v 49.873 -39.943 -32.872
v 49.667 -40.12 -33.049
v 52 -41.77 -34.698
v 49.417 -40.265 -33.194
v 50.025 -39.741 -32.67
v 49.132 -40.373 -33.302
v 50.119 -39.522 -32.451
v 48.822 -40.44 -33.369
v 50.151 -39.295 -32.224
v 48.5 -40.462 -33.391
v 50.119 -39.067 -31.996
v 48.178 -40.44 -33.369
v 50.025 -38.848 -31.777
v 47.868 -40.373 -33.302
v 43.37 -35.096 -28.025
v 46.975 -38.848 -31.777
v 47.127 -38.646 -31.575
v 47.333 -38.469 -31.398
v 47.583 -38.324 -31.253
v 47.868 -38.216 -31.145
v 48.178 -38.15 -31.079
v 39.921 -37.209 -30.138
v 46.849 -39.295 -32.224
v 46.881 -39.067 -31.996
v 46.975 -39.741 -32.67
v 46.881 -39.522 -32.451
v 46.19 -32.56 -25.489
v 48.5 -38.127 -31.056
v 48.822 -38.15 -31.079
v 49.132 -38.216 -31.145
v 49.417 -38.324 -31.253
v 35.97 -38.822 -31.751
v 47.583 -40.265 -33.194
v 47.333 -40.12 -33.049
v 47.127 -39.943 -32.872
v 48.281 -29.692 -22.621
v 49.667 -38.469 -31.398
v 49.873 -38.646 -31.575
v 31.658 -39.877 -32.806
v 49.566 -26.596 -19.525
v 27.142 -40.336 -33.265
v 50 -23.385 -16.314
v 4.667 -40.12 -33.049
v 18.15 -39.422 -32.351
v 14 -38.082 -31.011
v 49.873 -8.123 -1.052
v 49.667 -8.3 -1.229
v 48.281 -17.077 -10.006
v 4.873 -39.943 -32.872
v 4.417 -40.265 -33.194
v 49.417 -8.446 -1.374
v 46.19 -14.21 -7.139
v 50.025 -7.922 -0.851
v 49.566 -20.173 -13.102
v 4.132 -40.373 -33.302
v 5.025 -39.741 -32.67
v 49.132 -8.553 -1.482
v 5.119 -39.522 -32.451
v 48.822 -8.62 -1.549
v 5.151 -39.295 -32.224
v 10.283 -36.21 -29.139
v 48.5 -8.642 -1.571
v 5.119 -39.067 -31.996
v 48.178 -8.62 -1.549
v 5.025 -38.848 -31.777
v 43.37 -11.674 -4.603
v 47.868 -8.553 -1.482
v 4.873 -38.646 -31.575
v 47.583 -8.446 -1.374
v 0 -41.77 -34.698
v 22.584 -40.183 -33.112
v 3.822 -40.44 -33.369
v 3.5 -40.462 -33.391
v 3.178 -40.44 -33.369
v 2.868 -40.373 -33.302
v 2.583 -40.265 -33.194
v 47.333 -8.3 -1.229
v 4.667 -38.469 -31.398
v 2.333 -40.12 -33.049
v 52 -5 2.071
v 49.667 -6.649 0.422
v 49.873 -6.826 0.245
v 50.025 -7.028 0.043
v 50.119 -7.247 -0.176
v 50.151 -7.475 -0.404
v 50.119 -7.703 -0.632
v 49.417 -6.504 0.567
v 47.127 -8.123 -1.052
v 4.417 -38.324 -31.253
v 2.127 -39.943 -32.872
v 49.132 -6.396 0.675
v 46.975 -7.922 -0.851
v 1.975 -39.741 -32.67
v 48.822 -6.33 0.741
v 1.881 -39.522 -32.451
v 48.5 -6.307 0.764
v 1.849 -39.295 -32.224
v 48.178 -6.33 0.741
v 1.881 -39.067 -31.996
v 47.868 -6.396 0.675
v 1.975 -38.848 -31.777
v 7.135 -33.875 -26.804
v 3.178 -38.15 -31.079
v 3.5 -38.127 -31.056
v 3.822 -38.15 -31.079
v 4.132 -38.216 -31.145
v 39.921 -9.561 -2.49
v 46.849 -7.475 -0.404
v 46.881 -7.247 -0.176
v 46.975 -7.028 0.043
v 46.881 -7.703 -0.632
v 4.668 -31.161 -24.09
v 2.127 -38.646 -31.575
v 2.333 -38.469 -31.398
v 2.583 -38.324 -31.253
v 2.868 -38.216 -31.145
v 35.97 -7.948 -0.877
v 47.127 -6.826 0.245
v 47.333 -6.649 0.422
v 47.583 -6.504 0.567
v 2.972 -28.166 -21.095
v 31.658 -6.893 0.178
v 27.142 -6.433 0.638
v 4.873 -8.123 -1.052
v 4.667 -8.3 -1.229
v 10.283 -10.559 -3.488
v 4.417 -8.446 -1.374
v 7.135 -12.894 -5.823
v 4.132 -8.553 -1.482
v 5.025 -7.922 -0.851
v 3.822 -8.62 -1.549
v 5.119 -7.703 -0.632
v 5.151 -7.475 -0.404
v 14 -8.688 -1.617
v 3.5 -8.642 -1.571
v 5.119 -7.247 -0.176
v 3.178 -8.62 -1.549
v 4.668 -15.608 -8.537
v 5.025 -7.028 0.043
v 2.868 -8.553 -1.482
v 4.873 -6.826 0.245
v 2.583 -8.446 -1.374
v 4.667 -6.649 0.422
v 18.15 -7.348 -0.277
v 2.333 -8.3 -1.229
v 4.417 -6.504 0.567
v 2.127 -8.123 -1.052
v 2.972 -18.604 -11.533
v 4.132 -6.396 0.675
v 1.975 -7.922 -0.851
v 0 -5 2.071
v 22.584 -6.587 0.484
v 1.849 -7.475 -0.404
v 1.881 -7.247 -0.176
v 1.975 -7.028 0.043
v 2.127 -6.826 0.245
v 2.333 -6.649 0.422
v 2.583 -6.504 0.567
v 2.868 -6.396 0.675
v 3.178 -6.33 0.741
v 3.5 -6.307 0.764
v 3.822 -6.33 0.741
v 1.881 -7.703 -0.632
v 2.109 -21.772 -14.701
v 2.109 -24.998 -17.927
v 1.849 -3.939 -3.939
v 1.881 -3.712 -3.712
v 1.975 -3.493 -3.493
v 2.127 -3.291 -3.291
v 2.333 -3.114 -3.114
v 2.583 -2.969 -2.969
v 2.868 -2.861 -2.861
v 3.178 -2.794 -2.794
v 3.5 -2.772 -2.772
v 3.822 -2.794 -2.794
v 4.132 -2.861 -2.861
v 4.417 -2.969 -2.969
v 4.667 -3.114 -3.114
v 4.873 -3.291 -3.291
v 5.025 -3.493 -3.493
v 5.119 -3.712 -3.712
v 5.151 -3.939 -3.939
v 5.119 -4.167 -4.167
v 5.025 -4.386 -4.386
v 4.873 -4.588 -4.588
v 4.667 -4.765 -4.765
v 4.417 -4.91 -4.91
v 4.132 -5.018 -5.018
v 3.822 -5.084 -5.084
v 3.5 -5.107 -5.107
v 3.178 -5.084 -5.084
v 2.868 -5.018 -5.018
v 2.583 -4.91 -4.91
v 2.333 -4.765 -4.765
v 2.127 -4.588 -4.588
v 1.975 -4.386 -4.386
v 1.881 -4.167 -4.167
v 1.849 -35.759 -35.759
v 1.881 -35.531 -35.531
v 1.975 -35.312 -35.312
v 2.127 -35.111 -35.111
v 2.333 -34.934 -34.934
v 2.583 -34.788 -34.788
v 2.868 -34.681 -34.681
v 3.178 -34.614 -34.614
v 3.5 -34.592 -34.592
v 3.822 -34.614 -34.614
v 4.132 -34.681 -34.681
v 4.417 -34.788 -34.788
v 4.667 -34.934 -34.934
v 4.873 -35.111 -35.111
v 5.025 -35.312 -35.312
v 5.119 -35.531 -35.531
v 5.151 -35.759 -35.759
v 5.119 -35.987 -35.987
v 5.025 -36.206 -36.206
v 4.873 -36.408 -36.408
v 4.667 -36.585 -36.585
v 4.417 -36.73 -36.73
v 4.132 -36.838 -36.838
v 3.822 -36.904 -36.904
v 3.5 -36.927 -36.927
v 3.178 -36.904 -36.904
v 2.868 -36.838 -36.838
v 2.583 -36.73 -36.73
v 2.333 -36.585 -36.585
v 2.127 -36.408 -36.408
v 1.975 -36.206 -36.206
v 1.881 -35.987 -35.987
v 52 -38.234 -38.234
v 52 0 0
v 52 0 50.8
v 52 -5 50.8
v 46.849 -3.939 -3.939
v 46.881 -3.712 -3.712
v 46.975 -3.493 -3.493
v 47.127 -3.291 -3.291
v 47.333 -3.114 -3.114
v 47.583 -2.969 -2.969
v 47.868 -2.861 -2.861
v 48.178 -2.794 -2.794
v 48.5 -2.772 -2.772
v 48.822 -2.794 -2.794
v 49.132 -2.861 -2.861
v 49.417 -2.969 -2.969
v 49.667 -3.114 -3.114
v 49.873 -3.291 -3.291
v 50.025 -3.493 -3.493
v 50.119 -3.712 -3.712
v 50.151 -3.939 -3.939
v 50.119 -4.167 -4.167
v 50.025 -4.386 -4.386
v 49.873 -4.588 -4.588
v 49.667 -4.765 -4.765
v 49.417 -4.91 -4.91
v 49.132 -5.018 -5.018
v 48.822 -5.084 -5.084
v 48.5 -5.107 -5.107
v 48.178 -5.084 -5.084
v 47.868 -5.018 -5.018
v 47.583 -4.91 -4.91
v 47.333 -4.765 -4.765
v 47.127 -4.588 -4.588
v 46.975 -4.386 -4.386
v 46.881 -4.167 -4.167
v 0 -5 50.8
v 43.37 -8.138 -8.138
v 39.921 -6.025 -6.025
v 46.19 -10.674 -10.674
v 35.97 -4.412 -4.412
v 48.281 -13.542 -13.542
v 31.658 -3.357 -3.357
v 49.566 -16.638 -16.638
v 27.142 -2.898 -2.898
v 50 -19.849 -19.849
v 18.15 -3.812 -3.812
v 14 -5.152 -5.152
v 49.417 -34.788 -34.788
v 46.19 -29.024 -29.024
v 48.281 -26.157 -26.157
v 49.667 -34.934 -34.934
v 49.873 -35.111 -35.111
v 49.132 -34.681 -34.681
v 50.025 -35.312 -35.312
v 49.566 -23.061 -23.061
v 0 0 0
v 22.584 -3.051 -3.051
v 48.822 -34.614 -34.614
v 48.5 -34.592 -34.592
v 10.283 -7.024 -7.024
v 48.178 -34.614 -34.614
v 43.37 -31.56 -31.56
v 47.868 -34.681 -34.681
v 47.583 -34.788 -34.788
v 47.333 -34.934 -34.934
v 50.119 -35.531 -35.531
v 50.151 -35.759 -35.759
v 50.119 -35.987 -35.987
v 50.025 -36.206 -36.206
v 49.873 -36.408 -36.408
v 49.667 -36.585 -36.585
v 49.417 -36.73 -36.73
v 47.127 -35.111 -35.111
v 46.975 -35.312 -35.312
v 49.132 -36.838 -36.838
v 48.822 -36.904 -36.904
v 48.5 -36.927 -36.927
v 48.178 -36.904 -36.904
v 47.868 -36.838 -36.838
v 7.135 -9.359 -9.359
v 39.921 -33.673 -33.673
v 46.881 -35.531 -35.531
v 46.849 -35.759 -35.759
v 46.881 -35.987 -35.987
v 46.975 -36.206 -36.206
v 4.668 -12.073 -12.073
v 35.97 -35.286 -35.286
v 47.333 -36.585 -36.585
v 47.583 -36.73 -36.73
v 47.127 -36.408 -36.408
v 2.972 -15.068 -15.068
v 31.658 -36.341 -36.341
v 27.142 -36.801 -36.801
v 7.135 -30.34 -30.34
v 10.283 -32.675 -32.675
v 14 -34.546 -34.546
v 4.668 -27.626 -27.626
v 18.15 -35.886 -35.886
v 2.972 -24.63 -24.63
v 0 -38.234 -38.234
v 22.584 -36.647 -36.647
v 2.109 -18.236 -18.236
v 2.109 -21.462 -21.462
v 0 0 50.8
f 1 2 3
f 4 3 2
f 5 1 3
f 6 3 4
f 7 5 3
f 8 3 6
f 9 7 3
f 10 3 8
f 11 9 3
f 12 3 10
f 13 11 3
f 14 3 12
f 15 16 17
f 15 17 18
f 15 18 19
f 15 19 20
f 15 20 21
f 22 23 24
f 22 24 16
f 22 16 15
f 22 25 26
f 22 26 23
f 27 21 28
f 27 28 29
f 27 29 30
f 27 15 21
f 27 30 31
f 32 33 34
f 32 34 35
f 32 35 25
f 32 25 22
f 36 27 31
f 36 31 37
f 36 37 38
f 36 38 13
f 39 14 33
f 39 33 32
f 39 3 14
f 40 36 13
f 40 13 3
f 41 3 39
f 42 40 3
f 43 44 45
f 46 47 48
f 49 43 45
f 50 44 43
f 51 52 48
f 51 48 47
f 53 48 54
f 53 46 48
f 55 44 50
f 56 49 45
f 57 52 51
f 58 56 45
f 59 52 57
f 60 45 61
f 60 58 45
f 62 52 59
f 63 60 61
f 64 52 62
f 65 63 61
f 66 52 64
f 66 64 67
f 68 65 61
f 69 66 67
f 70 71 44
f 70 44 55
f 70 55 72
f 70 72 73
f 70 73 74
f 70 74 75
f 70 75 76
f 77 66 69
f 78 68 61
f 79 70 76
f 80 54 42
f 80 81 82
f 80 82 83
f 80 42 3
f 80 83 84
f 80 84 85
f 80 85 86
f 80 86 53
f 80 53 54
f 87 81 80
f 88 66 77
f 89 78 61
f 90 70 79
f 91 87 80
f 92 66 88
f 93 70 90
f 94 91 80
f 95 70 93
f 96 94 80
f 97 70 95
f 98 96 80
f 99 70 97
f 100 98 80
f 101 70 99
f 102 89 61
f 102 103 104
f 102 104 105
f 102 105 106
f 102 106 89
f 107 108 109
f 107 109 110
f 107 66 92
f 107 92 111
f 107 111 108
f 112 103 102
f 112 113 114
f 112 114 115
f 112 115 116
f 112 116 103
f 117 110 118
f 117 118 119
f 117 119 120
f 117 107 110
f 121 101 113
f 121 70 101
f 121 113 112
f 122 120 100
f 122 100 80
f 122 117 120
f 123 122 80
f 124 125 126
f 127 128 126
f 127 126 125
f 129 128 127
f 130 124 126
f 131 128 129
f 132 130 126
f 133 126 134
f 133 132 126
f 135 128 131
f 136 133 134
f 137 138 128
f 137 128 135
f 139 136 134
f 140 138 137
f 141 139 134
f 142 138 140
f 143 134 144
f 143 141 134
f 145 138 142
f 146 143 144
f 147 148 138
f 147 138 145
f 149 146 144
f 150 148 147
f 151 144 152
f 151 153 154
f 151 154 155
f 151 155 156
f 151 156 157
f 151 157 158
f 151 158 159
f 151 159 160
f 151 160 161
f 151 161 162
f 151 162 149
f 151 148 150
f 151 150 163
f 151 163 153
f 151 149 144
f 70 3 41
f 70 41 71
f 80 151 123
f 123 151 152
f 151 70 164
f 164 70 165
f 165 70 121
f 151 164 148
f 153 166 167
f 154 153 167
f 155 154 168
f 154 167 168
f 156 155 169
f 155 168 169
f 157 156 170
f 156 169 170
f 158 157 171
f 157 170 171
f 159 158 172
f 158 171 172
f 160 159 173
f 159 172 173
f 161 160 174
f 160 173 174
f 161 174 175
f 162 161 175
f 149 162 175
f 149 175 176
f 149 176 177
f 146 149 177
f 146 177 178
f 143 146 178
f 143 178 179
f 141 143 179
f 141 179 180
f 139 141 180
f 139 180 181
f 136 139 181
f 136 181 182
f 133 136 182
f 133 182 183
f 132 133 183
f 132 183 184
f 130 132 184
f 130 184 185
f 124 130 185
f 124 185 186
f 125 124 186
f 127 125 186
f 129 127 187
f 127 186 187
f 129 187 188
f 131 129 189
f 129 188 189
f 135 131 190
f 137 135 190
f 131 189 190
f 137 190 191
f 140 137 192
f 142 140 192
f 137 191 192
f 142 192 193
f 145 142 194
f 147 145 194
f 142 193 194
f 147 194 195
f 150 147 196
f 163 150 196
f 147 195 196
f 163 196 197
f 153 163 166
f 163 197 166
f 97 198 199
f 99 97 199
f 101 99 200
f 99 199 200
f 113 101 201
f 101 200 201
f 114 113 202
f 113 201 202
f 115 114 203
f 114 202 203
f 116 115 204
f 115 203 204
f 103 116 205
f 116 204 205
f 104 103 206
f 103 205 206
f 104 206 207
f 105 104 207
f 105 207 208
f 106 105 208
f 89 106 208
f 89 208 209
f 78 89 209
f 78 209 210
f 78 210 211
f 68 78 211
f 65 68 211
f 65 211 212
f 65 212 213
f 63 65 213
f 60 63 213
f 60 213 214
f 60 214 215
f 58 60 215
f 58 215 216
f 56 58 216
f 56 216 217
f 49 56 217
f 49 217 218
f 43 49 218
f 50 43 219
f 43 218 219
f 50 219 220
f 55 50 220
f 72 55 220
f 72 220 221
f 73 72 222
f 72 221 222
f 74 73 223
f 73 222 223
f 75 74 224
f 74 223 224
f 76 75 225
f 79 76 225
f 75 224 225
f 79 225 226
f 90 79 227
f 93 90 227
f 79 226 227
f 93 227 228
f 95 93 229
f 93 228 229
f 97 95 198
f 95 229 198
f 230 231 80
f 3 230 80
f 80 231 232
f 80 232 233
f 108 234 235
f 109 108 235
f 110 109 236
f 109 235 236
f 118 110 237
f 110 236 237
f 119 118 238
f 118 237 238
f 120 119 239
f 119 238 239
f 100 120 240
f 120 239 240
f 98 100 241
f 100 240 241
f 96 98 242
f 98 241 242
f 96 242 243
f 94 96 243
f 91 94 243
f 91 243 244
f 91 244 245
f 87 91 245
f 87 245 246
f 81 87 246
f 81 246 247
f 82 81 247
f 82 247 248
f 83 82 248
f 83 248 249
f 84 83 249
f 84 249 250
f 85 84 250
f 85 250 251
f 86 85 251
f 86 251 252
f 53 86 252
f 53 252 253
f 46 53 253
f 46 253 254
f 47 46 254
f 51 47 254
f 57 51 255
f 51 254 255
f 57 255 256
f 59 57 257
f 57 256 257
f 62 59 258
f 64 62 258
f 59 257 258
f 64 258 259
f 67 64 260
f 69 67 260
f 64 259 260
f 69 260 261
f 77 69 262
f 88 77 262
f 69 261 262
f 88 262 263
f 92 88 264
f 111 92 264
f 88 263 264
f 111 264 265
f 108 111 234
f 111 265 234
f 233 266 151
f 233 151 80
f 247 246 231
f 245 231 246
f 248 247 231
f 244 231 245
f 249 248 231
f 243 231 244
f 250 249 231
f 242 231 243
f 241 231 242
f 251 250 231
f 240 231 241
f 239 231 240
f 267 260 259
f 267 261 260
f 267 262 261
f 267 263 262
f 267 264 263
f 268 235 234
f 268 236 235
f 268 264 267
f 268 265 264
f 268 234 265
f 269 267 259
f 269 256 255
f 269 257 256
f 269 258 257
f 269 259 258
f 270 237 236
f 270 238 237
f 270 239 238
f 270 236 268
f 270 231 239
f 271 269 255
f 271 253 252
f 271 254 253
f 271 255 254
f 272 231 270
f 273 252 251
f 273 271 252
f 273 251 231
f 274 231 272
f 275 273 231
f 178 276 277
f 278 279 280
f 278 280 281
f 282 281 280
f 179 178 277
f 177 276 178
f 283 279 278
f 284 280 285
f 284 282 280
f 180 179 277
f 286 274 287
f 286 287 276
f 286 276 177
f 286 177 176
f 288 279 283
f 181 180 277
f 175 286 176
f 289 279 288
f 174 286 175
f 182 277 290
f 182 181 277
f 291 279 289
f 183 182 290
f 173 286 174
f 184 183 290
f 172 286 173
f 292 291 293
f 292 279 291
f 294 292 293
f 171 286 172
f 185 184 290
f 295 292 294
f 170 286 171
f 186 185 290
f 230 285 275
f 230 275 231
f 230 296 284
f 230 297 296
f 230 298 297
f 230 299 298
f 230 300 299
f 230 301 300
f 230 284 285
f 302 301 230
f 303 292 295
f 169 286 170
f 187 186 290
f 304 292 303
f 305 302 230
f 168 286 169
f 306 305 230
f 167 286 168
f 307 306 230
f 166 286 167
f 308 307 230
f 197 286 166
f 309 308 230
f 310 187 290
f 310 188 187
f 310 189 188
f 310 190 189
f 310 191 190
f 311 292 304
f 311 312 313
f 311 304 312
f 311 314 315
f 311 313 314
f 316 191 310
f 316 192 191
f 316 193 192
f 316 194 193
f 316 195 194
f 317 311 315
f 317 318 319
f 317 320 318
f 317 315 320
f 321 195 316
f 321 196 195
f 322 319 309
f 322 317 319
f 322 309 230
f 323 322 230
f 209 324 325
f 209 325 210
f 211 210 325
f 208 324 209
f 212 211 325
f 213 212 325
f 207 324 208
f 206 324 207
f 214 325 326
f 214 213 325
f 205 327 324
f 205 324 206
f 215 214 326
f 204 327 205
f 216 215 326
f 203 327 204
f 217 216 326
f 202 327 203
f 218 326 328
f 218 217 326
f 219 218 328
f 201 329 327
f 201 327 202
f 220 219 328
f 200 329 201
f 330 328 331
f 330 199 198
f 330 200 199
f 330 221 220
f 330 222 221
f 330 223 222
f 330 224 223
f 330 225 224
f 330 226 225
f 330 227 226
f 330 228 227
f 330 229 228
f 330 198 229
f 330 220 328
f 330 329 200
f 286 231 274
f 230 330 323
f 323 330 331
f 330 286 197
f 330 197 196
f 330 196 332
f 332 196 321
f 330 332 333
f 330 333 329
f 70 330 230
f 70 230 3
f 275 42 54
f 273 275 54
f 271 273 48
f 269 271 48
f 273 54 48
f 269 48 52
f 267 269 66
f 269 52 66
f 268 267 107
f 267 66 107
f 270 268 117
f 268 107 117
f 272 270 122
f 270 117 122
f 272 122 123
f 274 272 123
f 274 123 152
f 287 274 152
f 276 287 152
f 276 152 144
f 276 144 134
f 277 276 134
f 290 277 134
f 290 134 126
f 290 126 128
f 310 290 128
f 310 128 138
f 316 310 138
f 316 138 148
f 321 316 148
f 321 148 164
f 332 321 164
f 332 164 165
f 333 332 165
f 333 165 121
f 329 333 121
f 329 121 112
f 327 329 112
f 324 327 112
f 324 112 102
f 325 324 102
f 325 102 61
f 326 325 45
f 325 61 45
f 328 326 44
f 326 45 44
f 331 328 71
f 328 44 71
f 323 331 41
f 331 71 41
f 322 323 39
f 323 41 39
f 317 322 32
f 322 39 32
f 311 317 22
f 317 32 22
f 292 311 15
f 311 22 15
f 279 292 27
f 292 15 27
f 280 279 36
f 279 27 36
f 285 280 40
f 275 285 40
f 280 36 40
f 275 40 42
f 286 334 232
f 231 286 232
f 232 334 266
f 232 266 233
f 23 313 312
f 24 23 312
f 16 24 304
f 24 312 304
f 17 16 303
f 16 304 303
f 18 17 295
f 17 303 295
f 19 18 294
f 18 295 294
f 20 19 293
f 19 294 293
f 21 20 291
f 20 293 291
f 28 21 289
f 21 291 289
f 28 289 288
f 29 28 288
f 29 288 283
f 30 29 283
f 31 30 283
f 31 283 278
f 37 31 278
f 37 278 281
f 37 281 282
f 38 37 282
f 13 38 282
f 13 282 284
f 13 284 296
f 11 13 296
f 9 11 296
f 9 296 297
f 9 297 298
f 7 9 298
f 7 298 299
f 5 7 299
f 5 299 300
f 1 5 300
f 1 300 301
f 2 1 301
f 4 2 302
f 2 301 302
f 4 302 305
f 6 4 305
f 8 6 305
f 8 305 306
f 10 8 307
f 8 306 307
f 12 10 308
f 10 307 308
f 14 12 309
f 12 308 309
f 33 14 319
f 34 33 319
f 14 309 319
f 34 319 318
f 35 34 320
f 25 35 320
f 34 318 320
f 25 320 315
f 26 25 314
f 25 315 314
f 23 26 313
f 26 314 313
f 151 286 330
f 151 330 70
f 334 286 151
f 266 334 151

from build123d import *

# Parameters (mm, degrees)
F0_W     = 52
F0_H     = 50.8
F1_DEPTH = 5
F3_DEPTH = 52
F5_D     = 3.302
F6_R     = 24
F7_DEPTH = 32.036534


with BuildPart() as f1:
    # F0 (on Front) → F1 (new body)
    with BuildSketch(Plane.XZ):
        with Locations((26, 25.4)):
            Rectangle(F0_W, F0_H)
    extrude(amount=F1_DEPTH)

    # F2 (on face) → F3 (join, through all)
    with BuildSketch(Plane(origin=(0, 0, 0), x_dir=(0, -1, 0), z_dir=(-1, 0, 0))):
        Polygon((5, 0), (0, 0), (38.234019, -38.234019), (41.769553, -34.698485), (5, 2.071068), align=None)
    extrude(amount=-F3_DEPTH)

    # F5 (through all)
    with Locations(Plane(origin=(0, -3.535534, 3.535534), x_dir=(1, 0, 0), z_dir=(0, -0.707107, 0.707107))):
        with Locations((48.5, -5.571068), (48.5, -50.571068), (3.5, -50.571068), (3.5, -5.571068)):
            Hole(F5_D / 2)

    # F6 (on face) → F7 (cut, through all)
    with BuildSketch(Plane(origin=(0, -3.535534, 3.535534), x_dir=(1, 0, 0), z_dir=(0, -0.707107, 0.707107))):
        with Locations((26, -28.071068)):
            Circle(F6_R)
    extrude(amount=-F7_DEPTH, mode=Mode.SUBTRACT)


solid = f1.part
